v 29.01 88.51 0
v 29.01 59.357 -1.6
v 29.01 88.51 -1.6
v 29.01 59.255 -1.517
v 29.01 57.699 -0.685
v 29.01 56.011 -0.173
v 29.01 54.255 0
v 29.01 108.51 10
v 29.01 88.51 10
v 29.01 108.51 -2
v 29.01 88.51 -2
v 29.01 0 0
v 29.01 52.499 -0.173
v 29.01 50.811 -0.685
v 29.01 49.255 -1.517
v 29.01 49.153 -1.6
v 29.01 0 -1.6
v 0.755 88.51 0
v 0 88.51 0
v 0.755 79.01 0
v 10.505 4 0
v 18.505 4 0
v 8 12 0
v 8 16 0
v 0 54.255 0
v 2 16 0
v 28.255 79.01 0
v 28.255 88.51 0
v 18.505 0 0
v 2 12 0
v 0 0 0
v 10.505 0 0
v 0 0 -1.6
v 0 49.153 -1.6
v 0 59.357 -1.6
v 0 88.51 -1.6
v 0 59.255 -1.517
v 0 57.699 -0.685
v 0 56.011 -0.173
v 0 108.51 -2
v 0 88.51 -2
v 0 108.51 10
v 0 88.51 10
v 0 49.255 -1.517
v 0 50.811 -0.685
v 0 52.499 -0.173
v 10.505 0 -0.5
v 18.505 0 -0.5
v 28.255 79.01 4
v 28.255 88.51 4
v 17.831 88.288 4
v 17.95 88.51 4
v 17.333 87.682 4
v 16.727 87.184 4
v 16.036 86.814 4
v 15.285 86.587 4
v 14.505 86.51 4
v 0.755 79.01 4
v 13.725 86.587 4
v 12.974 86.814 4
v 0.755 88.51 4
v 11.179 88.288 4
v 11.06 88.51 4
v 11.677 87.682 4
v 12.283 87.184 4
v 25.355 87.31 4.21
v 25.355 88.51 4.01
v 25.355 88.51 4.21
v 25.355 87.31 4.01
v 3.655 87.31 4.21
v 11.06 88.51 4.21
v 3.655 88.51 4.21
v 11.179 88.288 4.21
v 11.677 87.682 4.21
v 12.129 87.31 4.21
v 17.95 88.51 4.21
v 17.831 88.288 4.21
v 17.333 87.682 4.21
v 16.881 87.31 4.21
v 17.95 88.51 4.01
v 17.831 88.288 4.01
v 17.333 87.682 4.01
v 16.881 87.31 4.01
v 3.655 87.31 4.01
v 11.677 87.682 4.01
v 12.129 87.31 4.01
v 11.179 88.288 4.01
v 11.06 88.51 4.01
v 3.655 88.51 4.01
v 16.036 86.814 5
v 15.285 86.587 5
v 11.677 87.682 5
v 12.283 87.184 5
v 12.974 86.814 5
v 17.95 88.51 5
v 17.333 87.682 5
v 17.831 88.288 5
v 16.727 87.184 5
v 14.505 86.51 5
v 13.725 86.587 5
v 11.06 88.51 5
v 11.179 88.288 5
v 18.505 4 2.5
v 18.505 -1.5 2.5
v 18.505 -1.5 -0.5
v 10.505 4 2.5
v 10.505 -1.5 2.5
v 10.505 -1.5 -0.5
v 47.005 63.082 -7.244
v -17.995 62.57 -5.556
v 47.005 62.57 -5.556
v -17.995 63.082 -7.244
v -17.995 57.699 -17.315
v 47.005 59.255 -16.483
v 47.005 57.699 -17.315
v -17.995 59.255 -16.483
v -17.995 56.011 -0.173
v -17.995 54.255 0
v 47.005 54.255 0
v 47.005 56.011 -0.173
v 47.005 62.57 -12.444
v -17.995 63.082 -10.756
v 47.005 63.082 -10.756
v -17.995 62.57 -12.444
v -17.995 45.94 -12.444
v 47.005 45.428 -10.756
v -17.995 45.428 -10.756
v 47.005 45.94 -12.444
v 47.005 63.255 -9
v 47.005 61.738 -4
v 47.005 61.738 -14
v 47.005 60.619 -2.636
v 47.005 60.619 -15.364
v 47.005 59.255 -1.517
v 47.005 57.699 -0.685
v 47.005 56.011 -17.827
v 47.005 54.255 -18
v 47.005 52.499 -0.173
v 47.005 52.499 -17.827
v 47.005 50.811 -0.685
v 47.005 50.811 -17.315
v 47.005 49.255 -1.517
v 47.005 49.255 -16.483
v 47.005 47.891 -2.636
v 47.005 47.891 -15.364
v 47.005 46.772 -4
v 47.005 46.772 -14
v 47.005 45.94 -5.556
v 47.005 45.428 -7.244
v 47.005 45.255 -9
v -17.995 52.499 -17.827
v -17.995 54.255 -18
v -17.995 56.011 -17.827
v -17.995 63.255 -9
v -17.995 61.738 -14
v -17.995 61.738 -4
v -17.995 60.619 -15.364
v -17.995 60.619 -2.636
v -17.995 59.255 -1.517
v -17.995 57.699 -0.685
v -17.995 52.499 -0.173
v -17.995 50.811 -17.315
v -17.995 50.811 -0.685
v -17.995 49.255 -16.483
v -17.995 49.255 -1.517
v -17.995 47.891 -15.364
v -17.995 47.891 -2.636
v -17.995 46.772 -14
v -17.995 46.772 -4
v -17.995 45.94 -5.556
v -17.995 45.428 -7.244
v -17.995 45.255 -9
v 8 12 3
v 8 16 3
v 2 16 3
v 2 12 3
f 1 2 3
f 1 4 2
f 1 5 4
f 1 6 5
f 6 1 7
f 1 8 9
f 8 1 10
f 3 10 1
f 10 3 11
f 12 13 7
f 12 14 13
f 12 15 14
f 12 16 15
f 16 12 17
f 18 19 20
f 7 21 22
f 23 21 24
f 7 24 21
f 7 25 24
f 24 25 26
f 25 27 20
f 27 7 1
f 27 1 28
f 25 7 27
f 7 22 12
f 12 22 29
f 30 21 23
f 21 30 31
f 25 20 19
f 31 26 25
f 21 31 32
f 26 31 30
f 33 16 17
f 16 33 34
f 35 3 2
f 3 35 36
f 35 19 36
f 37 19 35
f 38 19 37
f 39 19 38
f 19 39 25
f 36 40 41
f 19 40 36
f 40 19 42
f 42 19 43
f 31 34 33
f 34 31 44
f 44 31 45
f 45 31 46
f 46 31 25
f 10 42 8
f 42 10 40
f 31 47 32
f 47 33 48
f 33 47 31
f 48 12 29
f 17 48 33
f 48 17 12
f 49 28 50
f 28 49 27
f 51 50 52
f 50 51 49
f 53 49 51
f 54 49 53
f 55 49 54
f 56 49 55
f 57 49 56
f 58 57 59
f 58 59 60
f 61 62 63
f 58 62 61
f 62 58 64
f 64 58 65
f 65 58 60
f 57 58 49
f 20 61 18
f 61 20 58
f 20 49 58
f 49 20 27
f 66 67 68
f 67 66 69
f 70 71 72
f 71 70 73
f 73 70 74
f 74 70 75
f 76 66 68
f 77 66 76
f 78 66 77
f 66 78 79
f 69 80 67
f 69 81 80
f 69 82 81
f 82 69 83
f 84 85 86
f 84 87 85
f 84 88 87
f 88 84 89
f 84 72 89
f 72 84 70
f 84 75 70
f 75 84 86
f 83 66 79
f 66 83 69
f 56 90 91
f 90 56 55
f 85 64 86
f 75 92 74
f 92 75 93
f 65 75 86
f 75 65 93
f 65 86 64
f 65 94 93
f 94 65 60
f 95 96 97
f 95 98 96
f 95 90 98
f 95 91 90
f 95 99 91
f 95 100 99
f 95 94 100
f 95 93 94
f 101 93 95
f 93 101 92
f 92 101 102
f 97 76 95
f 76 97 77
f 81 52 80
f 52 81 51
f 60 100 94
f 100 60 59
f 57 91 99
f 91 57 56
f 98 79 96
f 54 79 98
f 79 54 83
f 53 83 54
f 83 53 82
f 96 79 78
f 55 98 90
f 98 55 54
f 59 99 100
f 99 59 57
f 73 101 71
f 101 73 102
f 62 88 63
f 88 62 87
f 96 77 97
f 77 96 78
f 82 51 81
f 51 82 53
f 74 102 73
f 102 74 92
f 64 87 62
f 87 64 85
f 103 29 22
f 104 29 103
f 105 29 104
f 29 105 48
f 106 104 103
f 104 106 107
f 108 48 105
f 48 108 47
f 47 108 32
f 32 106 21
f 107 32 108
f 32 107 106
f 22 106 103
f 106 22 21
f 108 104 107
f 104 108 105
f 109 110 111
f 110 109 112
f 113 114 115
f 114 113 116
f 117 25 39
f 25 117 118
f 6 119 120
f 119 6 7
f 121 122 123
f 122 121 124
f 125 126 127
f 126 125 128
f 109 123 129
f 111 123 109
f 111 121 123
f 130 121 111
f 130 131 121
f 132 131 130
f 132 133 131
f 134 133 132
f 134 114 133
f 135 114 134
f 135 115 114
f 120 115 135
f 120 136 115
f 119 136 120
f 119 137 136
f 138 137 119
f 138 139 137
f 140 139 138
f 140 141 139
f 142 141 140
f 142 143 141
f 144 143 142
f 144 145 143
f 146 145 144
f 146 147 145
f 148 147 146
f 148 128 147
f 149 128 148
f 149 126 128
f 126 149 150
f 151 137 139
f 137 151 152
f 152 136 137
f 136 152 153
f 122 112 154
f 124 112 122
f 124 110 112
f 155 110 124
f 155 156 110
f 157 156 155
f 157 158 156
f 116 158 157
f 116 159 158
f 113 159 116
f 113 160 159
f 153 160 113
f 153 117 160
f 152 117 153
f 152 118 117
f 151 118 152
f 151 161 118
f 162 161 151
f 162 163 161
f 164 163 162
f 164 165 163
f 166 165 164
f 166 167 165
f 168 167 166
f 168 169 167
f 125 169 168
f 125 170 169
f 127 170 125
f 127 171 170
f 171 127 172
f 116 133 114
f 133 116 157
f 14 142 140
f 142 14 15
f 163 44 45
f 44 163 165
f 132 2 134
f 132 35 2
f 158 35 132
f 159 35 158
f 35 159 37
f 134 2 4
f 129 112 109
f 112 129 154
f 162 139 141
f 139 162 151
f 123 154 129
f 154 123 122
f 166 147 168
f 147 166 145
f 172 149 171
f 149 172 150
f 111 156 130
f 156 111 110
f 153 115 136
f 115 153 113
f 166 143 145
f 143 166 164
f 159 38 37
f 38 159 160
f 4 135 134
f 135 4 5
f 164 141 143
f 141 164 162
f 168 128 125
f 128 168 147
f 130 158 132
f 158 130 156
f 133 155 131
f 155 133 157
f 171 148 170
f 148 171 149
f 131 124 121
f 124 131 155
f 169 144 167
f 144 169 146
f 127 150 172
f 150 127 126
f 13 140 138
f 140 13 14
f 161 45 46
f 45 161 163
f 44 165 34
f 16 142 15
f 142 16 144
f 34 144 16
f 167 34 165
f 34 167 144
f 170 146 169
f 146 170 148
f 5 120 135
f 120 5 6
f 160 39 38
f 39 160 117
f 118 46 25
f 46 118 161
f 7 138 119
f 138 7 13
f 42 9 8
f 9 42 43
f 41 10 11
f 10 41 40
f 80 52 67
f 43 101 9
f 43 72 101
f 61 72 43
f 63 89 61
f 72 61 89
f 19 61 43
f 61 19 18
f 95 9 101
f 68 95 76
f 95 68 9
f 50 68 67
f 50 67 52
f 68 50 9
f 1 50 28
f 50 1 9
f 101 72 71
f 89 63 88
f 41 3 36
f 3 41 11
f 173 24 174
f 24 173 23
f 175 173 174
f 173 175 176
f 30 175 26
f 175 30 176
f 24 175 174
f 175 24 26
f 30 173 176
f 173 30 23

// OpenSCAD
// BlueShift™ T-Lion mechanical reference envelopes (NOT a finished enclosure).
// Units: millimetres. Coordinate system: see 3dprint/ENCLOSURE-SPEC.md / board.json.
//
// Status:
//   PCB outline 108.51 x 29.01 — DOCUMENTED (LilyGO size)
//   Feature positions — PROVISIONAL spatial zones for Plasticity planning
//
// Export: OpenSCAD → STL, or FreeCAD/OpenSCAD → STEP into ../step/

$fn = 32;

pcb_w = 29.01;   // X
pcb_l = 108.51;  // Y
pcb_t = 1.6;     // Z into board — PROVISIONAL laminate

// --- PCB slab (top at Z=0) ---
module pcb() {
    color("forestgreen")
        translate([0, 0, -pcb_t])
            cube([pcb_w, pcb_l, pcb_t]);
}

// OLED module envelope near +Y — PROVISIONAL placement
module oled_module() {
    ow = 27.5; oh = 27.5; ot = 4.0; // DERIVED/PROVISIONAL
    color("black")
        translate([(pcb_w - ow) / 2, pcb_l - oh - 2, 0])
            cube([ow, oh, ot]);
}

// Visible AA opening candidate (for visual check only)
module oled_active_hint() {
    aw = 21.7; ah = 10.9;
    color("dodgerblue", 0.5)
        translate([(pcb_w - aw) / 2, pcb_l - 2 - 27.5 / 2 - ah / 2, 4.01])
            cube([aw, ah, 0.2]);
}

// 5-way actuator zone — PROVISIONAL
module fiveway_zone() {
    color("silver")
        translate([pcb_w / 2, pcb_l - 18, 0])
            cylinder(h = 5, d = 8);
}

// Micro-USB shell zone at -Y — PROVISIONAL
module usb_zone() {
    color("slategray")
        translate([(pcb_w - 8) / 2, -1.5, -0.5])
            cube([8, 5.5, 3]);
}

// 18650 cell envelope (centered along length) — form DOCUMENTED
module cell_18650() {
    color("steelblue", 0.6)
        translate([pcb_w / 2, pcb_l / 2, -9])
            rotate([0, 90, 0])
                cylinder(h = 65, d = 18, center = true);
}

// Antenna keep-out box near +Y tip — PROVISIONAL
module antenna_keepout() {
    color("red", 0.25)
        translate([0, pcb_l - 20, -2])
            cube([pcb_w, 20, 12]);
}

// BAT switch access hint near mid/-Y — PROVISIONAL
module bat_switch_hint() {
    color("orange")
        translate([2, 12, 0])
            cube([6, 4, 3]);
}

pcb();
oled_module();
oled_active_hint();
fiveway_zone();
usb_zone();
cell_18650();
antenna_keepout();
bat_switch_hint();
